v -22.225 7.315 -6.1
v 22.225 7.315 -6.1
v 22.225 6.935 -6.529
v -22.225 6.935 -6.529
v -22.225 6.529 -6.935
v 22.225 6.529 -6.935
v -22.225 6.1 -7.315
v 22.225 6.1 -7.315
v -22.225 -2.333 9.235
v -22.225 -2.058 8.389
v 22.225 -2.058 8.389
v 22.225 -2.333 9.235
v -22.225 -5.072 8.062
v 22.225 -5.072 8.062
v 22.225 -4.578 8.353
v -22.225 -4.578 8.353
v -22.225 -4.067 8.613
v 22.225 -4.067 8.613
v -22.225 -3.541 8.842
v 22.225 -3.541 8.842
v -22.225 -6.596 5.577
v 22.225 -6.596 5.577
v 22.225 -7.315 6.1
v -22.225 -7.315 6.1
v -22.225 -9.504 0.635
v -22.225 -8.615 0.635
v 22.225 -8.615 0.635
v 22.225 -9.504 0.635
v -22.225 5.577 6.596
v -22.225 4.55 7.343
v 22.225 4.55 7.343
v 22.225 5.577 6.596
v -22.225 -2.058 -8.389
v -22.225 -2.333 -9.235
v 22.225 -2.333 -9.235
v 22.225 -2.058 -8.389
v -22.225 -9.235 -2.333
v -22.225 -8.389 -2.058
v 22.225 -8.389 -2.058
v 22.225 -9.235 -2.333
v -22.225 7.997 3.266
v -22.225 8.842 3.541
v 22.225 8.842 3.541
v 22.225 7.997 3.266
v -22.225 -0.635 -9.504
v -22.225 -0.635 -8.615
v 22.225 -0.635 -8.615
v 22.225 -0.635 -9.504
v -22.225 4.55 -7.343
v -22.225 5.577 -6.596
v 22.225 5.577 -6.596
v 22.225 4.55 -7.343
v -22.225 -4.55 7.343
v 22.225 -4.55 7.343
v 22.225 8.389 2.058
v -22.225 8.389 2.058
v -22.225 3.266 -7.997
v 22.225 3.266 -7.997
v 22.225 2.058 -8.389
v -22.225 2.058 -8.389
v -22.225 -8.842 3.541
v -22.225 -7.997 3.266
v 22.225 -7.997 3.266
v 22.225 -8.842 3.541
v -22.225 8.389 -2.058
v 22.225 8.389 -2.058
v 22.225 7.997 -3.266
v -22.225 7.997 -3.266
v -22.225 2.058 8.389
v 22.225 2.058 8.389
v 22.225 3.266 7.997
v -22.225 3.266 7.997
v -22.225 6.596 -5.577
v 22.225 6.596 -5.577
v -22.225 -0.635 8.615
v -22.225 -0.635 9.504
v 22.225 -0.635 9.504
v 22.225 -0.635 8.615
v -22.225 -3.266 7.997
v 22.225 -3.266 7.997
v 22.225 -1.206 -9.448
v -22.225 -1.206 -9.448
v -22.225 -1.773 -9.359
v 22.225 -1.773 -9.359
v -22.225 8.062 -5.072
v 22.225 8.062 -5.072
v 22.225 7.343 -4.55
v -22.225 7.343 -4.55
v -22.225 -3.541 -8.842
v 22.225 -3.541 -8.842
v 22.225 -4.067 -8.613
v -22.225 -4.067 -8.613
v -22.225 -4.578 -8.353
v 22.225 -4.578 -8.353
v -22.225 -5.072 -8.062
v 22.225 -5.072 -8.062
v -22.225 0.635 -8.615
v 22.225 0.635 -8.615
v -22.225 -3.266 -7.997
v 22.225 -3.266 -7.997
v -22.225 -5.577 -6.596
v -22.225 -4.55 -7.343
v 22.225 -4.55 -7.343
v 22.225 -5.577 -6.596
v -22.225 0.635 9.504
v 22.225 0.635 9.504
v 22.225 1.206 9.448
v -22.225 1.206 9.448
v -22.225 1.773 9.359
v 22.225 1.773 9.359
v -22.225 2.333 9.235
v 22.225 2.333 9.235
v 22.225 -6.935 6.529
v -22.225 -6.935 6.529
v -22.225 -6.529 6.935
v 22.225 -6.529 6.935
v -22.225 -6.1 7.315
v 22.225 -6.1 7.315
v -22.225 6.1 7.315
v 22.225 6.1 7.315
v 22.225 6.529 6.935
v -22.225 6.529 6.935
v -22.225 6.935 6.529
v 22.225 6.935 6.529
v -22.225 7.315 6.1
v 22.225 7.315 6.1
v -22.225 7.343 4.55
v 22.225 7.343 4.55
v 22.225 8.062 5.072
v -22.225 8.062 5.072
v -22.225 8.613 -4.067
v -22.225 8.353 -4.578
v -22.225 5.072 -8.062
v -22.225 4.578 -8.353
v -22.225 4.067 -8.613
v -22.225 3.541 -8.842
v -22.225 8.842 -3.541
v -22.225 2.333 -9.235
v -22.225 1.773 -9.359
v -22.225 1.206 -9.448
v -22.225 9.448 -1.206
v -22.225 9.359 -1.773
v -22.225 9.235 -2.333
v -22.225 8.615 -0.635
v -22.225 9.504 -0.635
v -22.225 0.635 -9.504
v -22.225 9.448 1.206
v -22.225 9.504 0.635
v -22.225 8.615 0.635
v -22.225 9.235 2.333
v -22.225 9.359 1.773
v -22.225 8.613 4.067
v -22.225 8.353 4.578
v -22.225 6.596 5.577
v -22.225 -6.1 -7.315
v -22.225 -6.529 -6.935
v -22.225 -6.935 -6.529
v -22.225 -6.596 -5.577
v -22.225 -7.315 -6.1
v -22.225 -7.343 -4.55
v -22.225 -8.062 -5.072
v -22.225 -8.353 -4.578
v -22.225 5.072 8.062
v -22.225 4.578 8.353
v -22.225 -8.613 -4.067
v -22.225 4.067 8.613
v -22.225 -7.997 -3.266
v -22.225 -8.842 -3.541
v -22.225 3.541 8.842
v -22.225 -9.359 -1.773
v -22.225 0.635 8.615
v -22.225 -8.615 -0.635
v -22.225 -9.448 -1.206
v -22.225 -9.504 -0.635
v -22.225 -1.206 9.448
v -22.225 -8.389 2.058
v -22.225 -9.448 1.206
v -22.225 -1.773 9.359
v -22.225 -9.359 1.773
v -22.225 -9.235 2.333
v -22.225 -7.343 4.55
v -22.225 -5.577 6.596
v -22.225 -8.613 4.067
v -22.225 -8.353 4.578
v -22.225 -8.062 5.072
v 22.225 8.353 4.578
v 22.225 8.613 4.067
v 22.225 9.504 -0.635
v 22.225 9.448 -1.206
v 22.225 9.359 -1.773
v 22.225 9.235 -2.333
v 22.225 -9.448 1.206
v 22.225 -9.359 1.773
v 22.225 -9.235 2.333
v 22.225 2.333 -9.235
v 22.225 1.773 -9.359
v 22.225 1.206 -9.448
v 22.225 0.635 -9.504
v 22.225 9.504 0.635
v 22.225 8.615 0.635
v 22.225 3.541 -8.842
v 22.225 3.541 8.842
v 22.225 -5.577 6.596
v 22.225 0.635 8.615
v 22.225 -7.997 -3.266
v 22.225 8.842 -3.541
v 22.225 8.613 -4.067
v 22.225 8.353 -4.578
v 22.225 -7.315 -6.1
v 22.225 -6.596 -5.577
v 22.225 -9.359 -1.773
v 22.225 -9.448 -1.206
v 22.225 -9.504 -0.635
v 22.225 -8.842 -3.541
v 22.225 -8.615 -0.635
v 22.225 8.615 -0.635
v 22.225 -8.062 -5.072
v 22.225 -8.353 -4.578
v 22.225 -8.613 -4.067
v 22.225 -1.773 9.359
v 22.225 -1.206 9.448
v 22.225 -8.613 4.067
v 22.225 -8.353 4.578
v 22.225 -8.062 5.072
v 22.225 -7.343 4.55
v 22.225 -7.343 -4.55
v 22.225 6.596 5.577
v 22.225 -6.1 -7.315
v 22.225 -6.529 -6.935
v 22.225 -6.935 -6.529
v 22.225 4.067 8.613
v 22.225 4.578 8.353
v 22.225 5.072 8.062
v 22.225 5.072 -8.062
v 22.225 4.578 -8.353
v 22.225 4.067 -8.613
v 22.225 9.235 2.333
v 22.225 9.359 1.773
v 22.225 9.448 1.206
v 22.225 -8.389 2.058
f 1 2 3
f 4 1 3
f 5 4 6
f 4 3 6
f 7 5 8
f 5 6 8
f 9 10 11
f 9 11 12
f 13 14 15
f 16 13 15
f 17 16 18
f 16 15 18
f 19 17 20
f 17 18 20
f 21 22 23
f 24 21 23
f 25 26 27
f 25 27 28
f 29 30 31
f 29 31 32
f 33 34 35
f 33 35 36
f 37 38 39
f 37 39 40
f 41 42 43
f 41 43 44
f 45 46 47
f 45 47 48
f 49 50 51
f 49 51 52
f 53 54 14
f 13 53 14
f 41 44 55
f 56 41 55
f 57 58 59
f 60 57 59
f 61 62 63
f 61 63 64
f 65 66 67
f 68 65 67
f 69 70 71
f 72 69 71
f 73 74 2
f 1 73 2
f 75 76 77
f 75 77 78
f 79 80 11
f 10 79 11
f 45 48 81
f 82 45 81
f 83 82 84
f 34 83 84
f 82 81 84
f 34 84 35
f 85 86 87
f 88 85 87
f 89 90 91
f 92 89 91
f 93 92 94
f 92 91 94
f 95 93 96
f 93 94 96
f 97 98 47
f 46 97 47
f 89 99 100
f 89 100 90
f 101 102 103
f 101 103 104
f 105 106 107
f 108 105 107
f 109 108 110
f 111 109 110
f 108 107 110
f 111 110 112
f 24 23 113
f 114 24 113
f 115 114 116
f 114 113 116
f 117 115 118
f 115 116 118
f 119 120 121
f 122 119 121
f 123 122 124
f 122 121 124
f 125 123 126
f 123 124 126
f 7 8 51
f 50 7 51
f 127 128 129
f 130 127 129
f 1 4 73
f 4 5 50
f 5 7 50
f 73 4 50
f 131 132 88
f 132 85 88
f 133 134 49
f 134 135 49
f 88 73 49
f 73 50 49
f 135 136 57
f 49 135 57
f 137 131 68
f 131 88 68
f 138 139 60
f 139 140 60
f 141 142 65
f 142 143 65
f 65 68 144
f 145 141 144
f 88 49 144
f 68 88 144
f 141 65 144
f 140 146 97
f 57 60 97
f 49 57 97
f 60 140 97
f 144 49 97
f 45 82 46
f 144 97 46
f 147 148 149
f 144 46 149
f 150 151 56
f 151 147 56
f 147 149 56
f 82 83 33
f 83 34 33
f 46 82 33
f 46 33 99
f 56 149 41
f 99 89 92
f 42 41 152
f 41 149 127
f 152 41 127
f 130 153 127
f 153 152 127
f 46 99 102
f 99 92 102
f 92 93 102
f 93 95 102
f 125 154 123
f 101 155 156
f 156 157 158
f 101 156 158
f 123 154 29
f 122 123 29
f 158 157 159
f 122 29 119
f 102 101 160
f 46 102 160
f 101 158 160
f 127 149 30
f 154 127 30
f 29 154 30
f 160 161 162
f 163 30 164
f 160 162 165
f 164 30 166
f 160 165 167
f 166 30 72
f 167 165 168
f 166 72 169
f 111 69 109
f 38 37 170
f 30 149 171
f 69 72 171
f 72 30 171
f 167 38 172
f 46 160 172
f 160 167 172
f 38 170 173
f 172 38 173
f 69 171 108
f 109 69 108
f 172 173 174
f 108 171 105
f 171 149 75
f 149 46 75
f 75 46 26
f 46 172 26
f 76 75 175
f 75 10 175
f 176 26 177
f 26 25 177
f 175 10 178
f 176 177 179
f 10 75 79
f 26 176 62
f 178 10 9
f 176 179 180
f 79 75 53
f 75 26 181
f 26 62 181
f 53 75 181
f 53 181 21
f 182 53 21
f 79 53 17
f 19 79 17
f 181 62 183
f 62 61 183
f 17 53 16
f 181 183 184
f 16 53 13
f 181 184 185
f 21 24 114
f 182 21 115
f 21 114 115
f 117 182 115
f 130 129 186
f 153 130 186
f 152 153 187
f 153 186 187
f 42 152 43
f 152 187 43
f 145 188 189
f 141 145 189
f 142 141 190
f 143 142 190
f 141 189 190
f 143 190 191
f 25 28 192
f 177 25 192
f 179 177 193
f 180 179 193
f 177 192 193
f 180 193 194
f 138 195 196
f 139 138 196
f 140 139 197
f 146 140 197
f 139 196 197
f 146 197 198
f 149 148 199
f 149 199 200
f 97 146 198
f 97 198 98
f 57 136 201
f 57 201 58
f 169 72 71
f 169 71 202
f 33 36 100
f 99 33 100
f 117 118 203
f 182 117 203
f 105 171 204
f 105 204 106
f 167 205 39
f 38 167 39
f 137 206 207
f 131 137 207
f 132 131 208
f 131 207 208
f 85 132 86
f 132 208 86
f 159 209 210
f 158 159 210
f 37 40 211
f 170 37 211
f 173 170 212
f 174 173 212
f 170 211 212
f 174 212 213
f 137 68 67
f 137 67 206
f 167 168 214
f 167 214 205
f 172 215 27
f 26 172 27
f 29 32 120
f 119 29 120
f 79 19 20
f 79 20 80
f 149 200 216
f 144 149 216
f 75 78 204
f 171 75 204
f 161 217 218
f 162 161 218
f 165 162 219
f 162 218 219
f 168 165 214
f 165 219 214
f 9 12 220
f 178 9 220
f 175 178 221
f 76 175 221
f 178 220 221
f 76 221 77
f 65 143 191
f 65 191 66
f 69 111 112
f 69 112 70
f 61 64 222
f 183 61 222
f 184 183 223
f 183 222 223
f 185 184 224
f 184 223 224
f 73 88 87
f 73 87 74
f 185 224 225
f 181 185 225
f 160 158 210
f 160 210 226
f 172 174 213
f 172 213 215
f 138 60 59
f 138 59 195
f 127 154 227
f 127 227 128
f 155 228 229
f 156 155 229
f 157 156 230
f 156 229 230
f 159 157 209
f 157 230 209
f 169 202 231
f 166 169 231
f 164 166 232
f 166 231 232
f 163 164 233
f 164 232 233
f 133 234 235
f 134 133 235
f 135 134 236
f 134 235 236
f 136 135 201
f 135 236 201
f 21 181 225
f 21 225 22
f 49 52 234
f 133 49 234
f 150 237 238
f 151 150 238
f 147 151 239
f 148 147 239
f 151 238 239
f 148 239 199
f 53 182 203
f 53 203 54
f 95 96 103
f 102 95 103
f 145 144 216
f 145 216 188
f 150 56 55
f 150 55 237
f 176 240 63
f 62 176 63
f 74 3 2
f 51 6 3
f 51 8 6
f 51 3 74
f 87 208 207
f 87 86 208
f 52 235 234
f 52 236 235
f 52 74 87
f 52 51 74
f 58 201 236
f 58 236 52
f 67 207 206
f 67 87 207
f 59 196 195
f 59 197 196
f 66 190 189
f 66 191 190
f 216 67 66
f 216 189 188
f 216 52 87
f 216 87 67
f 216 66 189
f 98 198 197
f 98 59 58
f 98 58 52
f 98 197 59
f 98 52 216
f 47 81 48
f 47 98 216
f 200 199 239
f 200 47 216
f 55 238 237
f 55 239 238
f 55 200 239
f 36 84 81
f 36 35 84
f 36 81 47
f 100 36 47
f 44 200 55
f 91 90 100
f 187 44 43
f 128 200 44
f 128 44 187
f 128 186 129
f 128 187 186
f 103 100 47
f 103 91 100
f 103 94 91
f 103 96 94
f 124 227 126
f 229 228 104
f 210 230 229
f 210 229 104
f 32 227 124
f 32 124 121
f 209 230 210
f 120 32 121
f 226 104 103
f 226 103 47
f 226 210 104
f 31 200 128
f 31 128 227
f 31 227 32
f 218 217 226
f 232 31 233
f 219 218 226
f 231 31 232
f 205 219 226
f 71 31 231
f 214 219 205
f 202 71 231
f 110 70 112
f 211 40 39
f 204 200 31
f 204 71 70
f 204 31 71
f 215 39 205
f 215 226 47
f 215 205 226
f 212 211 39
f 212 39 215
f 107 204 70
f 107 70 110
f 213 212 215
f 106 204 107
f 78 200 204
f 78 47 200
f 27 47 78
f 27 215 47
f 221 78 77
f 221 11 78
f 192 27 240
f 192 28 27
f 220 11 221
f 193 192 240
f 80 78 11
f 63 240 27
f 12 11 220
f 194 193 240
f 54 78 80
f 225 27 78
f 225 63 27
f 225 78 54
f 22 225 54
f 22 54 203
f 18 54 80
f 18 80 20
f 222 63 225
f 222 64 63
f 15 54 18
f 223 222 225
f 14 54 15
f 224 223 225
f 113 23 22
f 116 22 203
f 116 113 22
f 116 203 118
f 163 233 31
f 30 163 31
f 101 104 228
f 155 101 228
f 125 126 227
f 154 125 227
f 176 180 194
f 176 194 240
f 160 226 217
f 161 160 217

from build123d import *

# Parameters (mm, degrees)
SKETCH1_W          = 44.45
SKETCH1_H          = 9.525
SKETCH2_OUTSIDE_W  = 31.446
SKETCH2_OUTSIDE_H  = 31.446
CUT_EXTRUDE1_DEPTH = 44.45


with BuildPart() as part:
    # Sketch1 → Revolve1 (revolve)
    with BuildSketch(Plane(origin=(0, 0, 0), x_dir=(1, 0, 0), z_dir=(0, 1, 0))):
        with Locations((0, 4.7625)):
            Rectangle(SKETCH1_W, SKETCH1_H)
    revolve(axis=Axis((17.670033956, 0, 0), (-1, 0, 0)))

    # Sketch2 outside → Cut-Extrude1 (cut)
    with BuildSketch(Plane(origin=(22.225, 0, 0), x_dir=(0, 0, -1), z_dir=(1, 0, 0))):
        Rectangle(SKETCH2_OUTSIDE_W, SKETCH2_OUTSIDE_H)
        with BuildLine():
            Line((-0.635, 8.614809762), (0.635, 8.614809762))
            Line((0.635, 8.614809762), (0.635, 9.503809762))
            ThreePointArc((0.635, 9.503809762), (1.49003828, 9.407731444), (2.33291784, 9.234885996))
            Line((2.33291784, 9.234885996), (2.058201732, 8.389396753))
            Line((2.058201732, 8.389396753), (3.266043508, 7.99694517))
            Line((3.266043508, 7.99694517), (3.540759616, 8.842434413))
            ThreePointArc((3.540759616, 8.842434413), (4.32425951, 8.486837143), (5.072473428, 8.061987244))
            Line((5.072473428, 8.061987244), (4.549932338, 7.342771136))
            Line((4.549932338, 7.342771136), (5.577383921, 6.596283866))
            Line((5.577383921, 6.596283866), (6.09992501, 7.315499974))
            ThreePointArc((6.09992501, 7.315499974), (6.735192091, 6.735192091), (7.315499974, 6.09992501))
            Line((7.315499974, 6.09992501), (6.596283866, 5.577383921))
            Line((6.596283866, 5.577383921), (7.342771136, 4.549932338))
            Line((7.342771136, 4.549932338), (8.061987244, 5.072473428))
            ThreePointArc((8.061987244, 5.072473428), (8.486837143, 4.32425951), (8.842434413, 3.540759616))
            Line((8.842434413, 3.540759616), (7.99694517, 3.266043508))
            Line((7.99694517, 3.266043508), (8.389396753, 2.058201732))
            Line((8.389396753, 2.058201732), (9.234885996, 2.33291784))
            ThreePointArc((9.234885996, 2.33291784), (9.407731444, 1.49003828), (9.503809762, 0.635))
            Line((9.503809762, 0.635), (8.614809762, 0.635))
            Line((8.614809762, 0.635), (8.614809762, -0.635))
            Line((8.614809762, -0.635), (9.503809762, -0.635))
            ThreePointArc((9.503809762, -0.635), (9.407731444, -1.49003828), (9.234885996, -2.33291784))
            Line((9.234885996, -2.33291784), (8.389396753, -2.058201732))
            Line((8.389396753, -2.058201732), (7.99694517, -3.266043508))
            Line((7.99694517, -3.266043508), (8.842434413, -3.540759616))
            ThreePointArc((8.842434413, -3.540759616), (8.486837143, -4.32425951), (8.061987244, -5.072473428))
            Line((8.061987244, -5.072473428), (7.342771136, -4.549932338))
            Line((7.342771136, -4.549932338), (6.596283866, -5.577383921))
            Line((6.596283866, -5.577383921), (7.315499974, -6.09992501))
            ThreePointArc((7.315499974, -6.09992501), (6.735192091, -6.735192091), (6.09992501, -7.315499974))
            Line((6.09992501, -7.315499974), (5.577383921, -6.596283866))
            Line((5.577383921, -6.596283866), (4.549932338, -7.342771136))
            Line((4.549932338, -7.342771136), (5.072473428, -8.061987244))
            ThreePointArc((5.072473428, -8.061987244), (4.32425951, -8.486837143), (3.540759616, -8.842434413))
            Line((3.540759616, -8.842434413), (3.266043508, -7.99694517))
            Line((3.266043508, -7.99694517), (2.058201732, -8.389396753))
            Line((2.058201732, -8.389396753), (2.33291784, -9.234885996))
            ThreePointArc((2.33291784, -9.234885996), (1.49003828, -9.407731444), (0.635, -9.503809762))
            Line((0.635, -9.503809762), (0.635, -8.614809762))
            Line((0.635, -8.614809762), (-0.635, -8.614809762))
            Line((-0.635, -8.614809762), (-0.635, -9.503809762))
            ThreePointArc((-0.635, -9.503809762), (-1.49003828, -9.407731444), (-2.33291784, -9.234885996))
            Line((-2.33291784, -9.234885996), (-2.058201732, -8.389396753))
            Line((-2.058201732, -8.389396753), (-3.266043508, -7.99694517))
            Line((-3.266043508, -7.99694517), (-3.540759616, -8.842434413))
            ThreePointArc((-3.540759616, -8.842434413), (-4.32425951, -8.486837143), (-5.072473428, -8.061987244))
            Line((-5.072473428, -8.061987244), (-4.549932338, -7.342771136))
            Line((-4.549932338, -7.342771136), (-5.577383921, -6.596283866))
            Line((-5.577383921, -6.596283866), (-6.09992501, -7.315499974))
            ThreePointArc((-6.09992501, -7.315499974), (-6.735192091, -6.735192091), (-7.315499974, -6.09992501))
            Line((-7.315499974, -6.09992501), (-6.596283866, -5.577383921))
            Line((-6.596283866, -5.577383921), (-7.342771136, -4.549932338))
            Line((-7.342771136, -4.549932338), (-8.061987244, -5.072473428))
            ThreePointArc((-8.061987244, -5.072473428), (-8.486837143, -4.32425951), (-8.842434413, -3.540759616))
            Line((-8.842434413, -3.540759616), (-7.99694517, -3.266043508))
            Line((-7.99694517, -3.266043508), (-8.389396753, -2.058201732))
            Line((-8.389396753, -2.058201732), (-9.234885996, -2.33291784))
            ThreePointArc((-9.234885996, -2.33291784), (-9.407731444, -1.49003828), (-9.503809762, -0.635))
            Line((-9.503809762, -0.635), (-8.614809762, -0.635))
            Line((-8.614809762, -0.635), (-8.614809762, 0.635))
            Line((-8.614809762, 0.635), (-9.503809762, 0.635))
            ThreePointArc((-9.503809762, 0.635), (-9.407731444, 1.49003828), (-9.234885996, 2.33291784))
            Line((-9.234885996, 2.33291784), (-8.389396753, 2.058201732))
            Line((-8.389396753, 2.058201732), (-7.99694517, 3.266043508))
            Line((-7.99694517, 3.266043508), (-8.842434413, 3.540759616))
            ThreePointArc((-8.842434413, 3.540759616), (-8.486837143, 4.32425951), (-8.061987244, 5.072473428))
            Line((-8.061987244, 5.072473428), (-7.342771136, 4.549932338))
            Line((-7.342771136, 4.549932338), (-6.596283866, 5.577383921))
            Line((-6.596283866, 5.577383921), (-7.315499974, 6.09992501))
            ThreePointArc((-7.315499974, 6.09992501), (-6.735192091, 6.735192091), (-6.09992501, 7.315499974))
            Line((-6.09992501, 7.315499974), (-5.577383921, 6.596283866))
            Line((-5.577383921, 6.596283866), (-4.549932338, 7.342771136))
            Line((-4.549932338, 7.342771136), (-5.072473428, 8.061987244))
            ThreePointArc((-5.072473428, 8.061987244), (-4.32425951, 8.486837143), (-3.540759616, 8.842434413))
            Line((-3.540759616, 8.842434413), (-3.266043508, 7.99694517))
            Line((-3.266043508, 7.99694517), (-2.058201732, 8.389396753))
            Line((-2.058201732, 8.389396753), (-2.33291784, 9.234885996))
            ThreePointArc((-2.33291784, 9.234885996), (-1.49003828, 9.407731444), (-0.635, 9.503809762))
            Line((-0.635, 9.503809762), (-0.635, 8.614809762))
        make_face(mode=Mode.SUBTRACT)
    extrude(amount=-CUT_EXTRUDE1_DEPTH, mode=Mode.SUBTRACT)


solid = part.part
